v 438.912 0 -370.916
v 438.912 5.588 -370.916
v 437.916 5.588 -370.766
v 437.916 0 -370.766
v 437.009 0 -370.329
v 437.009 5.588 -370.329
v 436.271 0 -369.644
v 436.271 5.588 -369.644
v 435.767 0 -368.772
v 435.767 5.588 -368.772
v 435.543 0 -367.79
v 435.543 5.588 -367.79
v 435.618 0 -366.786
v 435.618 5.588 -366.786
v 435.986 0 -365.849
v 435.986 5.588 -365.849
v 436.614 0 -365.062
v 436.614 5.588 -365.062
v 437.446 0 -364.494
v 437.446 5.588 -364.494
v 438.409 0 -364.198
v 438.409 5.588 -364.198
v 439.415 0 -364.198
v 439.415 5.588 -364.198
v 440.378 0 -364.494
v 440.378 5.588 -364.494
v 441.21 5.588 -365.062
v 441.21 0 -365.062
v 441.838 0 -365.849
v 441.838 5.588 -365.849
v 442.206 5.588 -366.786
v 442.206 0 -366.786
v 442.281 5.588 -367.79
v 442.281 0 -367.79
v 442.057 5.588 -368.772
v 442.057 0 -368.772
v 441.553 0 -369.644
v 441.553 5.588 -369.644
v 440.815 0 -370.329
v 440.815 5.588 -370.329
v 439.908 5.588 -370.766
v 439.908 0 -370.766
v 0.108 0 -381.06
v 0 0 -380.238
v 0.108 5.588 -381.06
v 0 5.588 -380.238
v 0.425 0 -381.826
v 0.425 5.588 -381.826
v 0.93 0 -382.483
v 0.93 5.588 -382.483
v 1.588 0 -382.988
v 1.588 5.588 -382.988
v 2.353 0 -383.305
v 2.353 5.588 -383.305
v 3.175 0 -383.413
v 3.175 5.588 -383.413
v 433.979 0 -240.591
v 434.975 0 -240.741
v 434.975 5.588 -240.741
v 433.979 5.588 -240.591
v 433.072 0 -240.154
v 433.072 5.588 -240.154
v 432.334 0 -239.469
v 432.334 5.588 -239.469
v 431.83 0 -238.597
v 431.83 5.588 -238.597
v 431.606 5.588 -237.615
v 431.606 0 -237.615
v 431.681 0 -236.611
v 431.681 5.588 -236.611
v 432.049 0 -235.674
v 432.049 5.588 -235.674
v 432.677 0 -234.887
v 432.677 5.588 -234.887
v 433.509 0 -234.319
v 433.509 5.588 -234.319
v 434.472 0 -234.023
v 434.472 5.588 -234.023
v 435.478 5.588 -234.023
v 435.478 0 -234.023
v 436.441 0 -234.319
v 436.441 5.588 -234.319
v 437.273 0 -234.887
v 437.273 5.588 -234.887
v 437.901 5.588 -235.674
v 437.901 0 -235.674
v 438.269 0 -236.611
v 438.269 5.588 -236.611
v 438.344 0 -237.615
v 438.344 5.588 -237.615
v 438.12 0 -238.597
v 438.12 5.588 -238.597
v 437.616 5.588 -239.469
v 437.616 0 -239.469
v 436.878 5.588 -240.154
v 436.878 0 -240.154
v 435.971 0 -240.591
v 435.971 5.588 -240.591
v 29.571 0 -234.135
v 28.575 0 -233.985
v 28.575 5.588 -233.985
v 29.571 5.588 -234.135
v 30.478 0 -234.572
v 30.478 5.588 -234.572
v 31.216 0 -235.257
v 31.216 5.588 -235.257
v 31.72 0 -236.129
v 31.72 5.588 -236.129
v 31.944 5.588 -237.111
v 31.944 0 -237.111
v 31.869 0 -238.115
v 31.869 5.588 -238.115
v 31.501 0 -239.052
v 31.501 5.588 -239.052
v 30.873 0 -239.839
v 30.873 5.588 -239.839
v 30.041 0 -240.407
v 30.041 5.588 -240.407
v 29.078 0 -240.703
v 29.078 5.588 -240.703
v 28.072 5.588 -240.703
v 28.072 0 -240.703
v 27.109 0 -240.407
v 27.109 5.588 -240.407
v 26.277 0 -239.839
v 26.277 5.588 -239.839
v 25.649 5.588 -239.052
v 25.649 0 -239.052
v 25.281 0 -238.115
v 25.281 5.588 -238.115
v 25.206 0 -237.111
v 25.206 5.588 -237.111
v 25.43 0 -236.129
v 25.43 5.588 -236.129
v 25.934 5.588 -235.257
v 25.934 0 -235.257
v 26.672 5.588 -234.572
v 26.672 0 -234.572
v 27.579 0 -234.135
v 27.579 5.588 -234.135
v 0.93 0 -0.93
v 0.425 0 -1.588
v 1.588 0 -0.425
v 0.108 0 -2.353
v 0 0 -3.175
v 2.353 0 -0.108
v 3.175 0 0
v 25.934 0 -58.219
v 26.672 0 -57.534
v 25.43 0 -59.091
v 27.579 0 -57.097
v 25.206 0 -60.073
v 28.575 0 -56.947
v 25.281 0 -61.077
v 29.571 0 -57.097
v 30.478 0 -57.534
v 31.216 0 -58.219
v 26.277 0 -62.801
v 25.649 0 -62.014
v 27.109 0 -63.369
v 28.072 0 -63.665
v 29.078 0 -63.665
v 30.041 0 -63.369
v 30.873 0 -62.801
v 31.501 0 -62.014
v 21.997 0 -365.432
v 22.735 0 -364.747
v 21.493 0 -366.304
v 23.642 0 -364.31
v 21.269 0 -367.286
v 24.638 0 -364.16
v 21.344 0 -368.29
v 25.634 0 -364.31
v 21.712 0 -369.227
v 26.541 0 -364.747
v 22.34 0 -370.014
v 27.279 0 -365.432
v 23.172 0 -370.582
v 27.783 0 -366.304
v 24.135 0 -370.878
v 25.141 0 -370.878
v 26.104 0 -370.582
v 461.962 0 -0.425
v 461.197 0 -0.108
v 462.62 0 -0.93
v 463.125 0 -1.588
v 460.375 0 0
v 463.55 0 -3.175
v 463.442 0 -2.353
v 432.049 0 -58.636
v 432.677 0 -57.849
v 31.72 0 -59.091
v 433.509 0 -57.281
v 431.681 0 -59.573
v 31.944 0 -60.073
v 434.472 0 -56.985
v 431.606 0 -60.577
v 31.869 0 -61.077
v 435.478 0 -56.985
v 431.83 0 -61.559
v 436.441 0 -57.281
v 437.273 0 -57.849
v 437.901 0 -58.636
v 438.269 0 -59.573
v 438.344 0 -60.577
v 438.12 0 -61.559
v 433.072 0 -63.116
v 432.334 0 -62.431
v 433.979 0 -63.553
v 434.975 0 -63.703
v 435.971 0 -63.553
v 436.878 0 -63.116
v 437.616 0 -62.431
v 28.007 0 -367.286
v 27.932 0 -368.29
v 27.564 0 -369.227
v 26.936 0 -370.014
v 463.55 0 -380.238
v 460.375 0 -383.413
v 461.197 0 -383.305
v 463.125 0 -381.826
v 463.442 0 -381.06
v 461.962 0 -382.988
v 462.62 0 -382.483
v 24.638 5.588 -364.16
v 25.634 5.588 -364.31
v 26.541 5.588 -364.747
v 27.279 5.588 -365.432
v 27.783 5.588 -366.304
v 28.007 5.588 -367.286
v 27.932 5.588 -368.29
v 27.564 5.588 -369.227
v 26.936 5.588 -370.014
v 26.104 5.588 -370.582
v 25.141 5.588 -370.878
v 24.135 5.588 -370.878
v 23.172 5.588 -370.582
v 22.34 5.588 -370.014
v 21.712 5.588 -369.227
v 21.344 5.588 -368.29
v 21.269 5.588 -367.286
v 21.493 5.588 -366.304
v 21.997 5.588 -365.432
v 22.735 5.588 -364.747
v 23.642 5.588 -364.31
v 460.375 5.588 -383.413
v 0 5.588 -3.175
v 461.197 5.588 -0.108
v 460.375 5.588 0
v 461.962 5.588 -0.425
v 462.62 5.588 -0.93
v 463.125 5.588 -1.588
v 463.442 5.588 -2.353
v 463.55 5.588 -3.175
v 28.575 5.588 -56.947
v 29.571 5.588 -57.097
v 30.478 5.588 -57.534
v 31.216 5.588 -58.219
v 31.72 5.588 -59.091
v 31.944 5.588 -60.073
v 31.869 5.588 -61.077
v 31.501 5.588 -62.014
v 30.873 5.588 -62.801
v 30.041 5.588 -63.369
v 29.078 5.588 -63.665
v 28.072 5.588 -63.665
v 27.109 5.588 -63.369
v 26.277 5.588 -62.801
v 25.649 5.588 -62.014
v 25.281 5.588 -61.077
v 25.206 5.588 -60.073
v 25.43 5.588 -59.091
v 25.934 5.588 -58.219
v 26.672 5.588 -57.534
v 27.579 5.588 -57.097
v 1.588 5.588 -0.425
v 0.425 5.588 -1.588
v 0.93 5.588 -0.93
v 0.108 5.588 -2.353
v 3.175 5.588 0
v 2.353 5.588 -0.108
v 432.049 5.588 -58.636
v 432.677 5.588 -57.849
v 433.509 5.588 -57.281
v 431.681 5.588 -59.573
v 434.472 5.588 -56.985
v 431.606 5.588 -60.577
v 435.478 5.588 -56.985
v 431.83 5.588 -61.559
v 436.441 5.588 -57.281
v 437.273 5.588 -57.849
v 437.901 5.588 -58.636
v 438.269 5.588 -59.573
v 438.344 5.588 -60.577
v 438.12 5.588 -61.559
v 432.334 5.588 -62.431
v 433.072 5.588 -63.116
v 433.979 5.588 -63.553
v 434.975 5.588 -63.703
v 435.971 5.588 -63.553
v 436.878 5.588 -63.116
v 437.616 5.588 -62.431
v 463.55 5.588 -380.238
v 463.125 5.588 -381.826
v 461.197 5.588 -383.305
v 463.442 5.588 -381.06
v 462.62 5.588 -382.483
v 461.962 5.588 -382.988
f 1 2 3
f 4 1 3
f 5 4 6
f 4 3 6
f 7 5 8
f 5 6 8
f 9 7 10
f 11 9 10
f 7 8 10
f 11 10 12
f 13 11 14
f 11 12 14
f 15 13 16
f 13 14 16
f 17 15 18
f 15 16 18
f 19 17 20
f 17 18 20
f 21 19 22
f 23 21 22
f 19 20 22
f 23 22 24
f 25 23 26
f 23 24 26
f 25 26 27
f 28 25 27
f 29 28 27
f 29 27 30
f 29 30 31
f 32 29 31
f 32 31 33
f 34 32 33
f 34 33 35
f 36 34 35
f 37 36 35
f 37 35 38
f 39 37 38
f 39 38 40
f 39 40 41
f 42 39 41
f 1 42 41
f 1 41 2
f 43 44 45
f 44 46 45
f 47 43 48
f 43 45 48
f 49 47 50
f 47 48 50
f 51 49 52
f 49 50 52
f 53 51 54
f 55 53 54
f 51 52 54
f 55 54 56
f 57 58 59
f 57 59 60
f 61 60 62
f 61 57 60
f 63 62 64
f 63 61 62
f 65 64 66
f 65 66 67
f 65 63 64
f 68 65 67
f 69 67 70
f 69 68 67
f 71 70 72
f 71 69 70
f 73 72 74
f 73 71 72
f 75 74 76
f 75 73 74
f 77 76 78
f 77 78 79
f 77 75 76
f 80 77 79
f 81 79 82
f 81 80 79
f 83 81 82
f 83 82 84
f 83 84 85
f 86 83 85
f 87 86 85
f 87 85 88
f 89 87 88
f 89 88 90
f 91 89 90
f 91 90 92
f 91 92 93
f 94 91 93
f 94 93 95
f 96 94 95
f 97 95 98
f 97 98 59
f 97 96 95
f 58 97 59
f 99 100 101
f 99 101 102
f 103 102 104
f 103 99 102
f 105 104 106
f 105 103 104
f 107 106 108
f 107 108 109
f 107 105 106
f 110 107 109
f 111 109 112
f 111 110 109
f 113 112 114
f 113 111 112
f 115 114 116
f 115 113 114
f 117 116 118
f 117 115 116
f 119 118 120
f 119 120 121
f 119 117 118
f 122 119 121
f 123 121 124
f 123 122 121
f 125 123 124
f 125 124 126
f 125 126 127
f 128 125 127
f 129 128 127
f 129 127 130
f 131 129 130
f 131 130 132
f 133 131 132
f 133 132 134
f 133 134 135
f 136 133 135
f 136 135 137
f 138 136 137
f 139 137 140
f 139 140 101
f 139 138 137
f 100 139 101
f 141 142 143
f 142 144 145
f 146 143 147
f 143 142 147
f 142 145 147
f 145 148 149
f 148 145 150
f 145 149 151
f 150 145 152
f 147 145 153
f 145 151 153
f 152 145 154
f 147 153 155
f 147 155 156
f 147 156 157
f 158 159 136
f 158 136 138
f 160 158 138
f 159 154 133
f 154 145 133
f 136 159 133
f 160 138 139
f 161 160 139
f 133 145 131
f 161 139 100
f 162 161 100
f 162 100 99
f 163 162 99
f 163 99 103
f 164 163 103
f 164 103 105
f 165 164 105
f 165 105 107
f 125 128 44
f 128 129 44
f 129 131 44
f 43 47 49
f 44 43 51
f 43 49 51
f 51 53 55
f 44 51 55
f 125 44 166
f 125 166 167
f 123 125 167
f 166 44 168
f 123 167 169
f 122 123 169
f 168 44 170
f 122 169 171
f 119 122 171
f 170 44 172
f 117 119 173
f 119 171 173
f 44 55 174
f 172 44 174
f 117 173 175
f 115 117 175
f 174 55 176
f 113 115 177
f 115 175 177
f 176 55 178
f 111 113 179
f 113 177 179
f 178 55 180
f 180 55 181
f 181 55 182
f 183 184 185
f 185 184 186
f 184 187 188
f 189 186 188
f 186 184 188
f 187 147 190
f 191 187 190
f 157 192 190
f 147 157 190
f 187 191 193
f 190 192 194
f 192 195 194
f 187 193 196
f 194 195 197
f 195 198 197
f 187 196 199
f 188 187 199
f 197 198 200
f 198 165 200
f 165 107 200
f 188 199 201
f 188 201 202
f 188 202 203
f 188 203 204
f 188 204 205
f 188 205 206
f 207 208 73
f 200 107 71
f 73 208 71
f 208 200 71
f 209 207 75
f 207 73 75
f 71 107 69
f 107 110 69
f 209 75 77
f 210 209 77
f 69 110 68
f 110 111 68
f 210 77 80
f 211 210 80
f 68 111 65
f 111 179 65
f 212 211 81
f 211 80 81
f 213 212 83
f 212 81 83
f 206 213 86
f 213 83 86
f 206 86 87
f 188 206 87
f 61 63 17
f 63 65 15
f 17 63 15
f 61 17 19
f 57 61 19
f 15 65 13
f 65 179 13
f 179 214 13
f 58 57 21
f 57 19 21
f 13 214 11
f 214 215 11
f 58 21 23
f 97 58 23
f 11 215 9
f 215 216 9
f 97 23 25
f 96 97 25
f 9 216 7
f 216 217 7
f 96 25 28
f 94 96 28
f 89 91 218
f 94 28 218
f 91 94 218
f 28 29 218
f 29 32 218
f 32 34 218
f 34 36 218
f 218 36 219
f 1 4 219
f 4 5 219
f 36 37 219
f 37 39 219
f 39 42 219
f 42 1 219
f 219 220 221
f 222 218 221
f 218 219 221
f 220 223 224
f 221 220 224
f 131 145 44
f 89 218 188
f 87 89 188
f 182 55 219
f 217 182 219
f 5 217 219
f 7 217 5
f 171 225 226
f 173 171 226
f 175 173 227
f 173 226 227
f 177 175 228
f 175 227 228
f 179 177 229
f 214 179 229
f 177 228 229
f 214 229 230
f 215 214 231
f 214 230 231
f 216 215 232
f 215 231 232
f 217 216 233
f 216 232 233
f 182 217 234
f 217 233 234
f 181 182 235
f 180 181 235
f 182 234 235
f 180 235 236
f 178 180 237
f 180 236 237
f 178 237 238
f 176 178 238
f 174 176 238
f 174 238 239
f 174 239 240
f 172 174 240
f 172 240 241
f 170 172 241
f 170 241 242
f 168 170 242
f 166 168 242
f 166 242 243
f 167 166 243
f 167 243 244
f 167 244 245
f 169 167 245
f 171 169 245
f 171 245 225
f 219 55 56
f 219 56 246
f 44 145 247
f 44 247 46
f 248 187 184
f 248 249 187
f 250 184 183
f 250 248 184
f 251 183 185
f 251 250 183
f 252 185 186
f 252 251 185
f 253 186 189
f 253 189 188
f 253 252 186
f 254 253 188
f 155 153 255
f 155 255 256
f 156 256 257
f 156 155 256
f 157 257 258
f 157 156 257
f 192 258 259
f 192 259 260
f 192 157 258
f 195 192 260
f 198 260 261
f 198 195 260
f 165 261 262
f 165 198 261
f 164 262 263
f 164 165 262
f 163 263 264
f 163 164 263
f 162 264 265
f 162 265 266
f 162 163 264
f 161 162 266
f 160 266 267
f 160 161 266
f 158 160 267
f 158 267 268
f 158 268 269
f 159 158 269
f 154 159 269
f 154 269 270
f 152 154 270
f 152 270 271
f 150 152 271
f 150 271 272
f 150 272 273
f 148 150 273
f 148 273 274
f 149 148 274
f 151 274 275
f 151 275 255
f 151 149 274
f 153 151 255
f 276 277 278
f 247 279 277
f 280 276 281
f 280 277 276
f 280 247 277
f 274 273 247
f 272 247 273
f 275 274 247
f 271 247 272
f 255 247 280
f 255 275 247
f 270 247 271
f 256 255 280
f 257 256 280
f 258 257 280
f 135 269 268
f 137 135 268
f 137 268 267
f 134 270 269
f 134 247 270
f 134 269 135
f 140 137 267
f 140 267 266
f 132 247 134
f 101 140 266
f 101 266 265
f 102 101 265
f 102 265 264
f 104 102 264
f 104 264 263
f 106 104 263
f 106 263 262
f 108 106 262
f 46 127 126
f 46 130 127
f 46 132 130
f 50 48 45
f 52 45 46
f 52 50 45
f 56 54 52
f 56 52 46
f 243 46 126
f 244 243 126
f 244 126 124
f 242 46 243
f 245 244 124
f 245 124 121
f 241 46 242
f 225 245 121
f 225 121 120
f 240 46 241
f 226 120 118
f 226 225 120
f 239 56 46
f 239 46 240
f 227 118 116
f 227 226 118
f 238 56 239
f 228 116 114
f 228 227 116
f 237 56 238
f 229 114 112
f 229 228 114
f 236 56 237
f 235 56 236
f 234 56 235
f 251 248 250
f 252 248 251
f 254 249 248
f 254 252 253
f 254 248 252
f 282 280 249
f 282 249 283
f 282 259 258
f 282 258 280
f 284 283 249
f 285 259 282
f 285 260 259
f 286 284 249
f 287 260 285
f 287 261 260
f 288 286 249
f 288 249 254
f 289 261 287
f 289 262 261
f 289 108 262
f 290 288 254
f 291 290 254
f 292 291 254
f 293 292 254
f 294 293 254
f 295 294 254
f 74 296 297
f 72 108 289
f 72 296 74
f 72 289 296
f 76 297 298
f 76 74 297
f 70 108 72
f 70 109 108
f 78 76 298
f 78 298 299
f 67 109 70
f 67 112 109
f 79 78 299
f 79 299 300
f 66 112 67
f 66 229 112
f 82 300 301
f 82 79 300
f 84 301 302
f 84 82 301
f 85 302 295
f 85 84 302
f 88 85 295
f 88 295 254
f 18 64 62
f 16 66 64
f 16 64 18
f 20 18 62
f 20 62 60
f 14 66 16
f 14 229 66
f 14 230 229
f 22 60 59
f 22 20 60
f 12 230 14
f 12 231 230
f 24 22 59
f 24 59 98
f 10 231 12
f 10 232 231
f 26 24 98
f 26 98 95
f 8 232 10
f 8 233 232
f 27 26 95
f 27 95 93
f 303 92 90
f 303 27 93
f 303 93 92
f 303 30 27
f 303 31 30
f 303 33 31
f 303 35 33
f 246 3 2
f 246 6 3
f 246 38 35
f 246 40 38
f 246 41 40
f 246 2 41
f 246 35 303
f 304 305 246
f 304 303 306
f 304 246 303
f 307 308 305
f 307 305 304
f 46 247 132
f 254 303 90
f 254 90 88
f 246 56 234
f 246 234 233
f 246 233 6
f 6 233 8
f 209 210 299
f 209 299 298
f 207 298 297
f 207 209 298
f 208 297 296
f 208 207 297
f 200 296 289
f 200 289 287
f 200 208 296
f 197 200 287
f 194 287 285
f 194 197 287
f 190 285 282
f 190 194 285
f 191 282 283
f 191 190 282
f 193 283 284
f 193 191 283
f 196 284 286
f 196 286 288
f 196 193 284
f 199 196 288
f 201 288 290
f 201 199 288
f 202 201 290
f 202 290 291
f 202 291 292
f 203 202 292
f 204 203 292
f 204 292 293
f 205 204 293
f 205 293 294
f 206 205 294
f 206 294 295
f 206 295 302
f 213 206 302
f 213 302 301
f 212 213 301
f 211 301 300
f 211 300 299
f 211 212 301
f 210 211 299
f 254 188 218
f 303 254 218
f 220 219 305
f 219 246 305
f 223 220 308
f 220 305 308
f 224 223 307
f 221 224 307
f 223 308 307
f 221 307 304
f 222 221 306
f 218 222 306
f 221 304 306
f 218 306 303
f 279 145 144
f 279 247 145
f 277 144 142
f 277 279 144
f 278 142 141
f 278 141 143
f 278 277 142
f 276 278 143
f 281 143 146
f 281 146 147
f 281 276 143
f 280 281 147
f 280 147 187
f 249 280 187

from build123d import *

# Parameters (mm, degrees)
SKETCH1_W           = 463.55
SKETCH1_H           = 383.413
SKETCH1_R           = 3.3782
BOSS_EXTRUDE1_DEPTH = 5.588
FILLET1_R           = 3.175
SKETCH2_R           = 3.3782
CUT_EXTRUDE1_DEPTH  = 602.594013279


with BuildPart() as part:
    # Sketch1 → Boss-Extrude1 (new body)
    with BuildSketch(Plane(origin=(0, 0, 0), x_dir=(1, 0, 0), z_dir=(0, 1, 0))):
        with Locations((231.775, 191.7065)):
            Rectangle(SKETCH1_W, SKETCH1_H)
        with Locations(Location((28.575, 60.325, 0), (0, 0, 270))):
            Circle(SKETCH1_R, mode=Mode.SUBTRACT)
        with Locations(Location((28.575, 237.363, 0), (0, 0, 270))):
            Circle(SKETCH1_R, mode=Mode.SUBTRACT)
        with Locations(Location((434.975, 237.363, 0), (0, 0, 90))):
            Circle(SKETCH1_R, mode=Mode.SUBTRACT)
        with Locations(Location((434.975, 60.325, 0), (0, 0, 90))):
            Circle(SKETCH1_R, mode=Mode.SUBTRACT)
    extrude(amount=BOSS_EXTRUDE1_DEPTH)

    # Fillet1
    fillet1_edges = [part.edges().sort_by_distance(p)[0] for p in [
        (0, 2.794, -383.413),
        (463.55, 2.794, -383.413),
        (463.55, 2.794, 0),
        (0, 2.794, 0),
    ]]
    fillet(fillet1_edges, radius=FILLET1_R)

    # Sketch2 → Cut-Extrude1 (cut, through all)
    with BuildSketch(Plane(origin=(0, 5.588, 0), x_dir=(1, 0, 0), z_dir=(0, 1, 0))):
        with Locations(Location((24.638, 367.538, 0), (0, 0, 270))):
            Circle(SKETCH2_R)
        with Locations(Location((438.912, 367.538, 0), (0, 0, 90))):
            Circle(SKETCH2_R)
    extrude(amount=-CUT_EXTRUDE1_DEPTH, mode=Mode.SUBTRACT)


solid = part.part
